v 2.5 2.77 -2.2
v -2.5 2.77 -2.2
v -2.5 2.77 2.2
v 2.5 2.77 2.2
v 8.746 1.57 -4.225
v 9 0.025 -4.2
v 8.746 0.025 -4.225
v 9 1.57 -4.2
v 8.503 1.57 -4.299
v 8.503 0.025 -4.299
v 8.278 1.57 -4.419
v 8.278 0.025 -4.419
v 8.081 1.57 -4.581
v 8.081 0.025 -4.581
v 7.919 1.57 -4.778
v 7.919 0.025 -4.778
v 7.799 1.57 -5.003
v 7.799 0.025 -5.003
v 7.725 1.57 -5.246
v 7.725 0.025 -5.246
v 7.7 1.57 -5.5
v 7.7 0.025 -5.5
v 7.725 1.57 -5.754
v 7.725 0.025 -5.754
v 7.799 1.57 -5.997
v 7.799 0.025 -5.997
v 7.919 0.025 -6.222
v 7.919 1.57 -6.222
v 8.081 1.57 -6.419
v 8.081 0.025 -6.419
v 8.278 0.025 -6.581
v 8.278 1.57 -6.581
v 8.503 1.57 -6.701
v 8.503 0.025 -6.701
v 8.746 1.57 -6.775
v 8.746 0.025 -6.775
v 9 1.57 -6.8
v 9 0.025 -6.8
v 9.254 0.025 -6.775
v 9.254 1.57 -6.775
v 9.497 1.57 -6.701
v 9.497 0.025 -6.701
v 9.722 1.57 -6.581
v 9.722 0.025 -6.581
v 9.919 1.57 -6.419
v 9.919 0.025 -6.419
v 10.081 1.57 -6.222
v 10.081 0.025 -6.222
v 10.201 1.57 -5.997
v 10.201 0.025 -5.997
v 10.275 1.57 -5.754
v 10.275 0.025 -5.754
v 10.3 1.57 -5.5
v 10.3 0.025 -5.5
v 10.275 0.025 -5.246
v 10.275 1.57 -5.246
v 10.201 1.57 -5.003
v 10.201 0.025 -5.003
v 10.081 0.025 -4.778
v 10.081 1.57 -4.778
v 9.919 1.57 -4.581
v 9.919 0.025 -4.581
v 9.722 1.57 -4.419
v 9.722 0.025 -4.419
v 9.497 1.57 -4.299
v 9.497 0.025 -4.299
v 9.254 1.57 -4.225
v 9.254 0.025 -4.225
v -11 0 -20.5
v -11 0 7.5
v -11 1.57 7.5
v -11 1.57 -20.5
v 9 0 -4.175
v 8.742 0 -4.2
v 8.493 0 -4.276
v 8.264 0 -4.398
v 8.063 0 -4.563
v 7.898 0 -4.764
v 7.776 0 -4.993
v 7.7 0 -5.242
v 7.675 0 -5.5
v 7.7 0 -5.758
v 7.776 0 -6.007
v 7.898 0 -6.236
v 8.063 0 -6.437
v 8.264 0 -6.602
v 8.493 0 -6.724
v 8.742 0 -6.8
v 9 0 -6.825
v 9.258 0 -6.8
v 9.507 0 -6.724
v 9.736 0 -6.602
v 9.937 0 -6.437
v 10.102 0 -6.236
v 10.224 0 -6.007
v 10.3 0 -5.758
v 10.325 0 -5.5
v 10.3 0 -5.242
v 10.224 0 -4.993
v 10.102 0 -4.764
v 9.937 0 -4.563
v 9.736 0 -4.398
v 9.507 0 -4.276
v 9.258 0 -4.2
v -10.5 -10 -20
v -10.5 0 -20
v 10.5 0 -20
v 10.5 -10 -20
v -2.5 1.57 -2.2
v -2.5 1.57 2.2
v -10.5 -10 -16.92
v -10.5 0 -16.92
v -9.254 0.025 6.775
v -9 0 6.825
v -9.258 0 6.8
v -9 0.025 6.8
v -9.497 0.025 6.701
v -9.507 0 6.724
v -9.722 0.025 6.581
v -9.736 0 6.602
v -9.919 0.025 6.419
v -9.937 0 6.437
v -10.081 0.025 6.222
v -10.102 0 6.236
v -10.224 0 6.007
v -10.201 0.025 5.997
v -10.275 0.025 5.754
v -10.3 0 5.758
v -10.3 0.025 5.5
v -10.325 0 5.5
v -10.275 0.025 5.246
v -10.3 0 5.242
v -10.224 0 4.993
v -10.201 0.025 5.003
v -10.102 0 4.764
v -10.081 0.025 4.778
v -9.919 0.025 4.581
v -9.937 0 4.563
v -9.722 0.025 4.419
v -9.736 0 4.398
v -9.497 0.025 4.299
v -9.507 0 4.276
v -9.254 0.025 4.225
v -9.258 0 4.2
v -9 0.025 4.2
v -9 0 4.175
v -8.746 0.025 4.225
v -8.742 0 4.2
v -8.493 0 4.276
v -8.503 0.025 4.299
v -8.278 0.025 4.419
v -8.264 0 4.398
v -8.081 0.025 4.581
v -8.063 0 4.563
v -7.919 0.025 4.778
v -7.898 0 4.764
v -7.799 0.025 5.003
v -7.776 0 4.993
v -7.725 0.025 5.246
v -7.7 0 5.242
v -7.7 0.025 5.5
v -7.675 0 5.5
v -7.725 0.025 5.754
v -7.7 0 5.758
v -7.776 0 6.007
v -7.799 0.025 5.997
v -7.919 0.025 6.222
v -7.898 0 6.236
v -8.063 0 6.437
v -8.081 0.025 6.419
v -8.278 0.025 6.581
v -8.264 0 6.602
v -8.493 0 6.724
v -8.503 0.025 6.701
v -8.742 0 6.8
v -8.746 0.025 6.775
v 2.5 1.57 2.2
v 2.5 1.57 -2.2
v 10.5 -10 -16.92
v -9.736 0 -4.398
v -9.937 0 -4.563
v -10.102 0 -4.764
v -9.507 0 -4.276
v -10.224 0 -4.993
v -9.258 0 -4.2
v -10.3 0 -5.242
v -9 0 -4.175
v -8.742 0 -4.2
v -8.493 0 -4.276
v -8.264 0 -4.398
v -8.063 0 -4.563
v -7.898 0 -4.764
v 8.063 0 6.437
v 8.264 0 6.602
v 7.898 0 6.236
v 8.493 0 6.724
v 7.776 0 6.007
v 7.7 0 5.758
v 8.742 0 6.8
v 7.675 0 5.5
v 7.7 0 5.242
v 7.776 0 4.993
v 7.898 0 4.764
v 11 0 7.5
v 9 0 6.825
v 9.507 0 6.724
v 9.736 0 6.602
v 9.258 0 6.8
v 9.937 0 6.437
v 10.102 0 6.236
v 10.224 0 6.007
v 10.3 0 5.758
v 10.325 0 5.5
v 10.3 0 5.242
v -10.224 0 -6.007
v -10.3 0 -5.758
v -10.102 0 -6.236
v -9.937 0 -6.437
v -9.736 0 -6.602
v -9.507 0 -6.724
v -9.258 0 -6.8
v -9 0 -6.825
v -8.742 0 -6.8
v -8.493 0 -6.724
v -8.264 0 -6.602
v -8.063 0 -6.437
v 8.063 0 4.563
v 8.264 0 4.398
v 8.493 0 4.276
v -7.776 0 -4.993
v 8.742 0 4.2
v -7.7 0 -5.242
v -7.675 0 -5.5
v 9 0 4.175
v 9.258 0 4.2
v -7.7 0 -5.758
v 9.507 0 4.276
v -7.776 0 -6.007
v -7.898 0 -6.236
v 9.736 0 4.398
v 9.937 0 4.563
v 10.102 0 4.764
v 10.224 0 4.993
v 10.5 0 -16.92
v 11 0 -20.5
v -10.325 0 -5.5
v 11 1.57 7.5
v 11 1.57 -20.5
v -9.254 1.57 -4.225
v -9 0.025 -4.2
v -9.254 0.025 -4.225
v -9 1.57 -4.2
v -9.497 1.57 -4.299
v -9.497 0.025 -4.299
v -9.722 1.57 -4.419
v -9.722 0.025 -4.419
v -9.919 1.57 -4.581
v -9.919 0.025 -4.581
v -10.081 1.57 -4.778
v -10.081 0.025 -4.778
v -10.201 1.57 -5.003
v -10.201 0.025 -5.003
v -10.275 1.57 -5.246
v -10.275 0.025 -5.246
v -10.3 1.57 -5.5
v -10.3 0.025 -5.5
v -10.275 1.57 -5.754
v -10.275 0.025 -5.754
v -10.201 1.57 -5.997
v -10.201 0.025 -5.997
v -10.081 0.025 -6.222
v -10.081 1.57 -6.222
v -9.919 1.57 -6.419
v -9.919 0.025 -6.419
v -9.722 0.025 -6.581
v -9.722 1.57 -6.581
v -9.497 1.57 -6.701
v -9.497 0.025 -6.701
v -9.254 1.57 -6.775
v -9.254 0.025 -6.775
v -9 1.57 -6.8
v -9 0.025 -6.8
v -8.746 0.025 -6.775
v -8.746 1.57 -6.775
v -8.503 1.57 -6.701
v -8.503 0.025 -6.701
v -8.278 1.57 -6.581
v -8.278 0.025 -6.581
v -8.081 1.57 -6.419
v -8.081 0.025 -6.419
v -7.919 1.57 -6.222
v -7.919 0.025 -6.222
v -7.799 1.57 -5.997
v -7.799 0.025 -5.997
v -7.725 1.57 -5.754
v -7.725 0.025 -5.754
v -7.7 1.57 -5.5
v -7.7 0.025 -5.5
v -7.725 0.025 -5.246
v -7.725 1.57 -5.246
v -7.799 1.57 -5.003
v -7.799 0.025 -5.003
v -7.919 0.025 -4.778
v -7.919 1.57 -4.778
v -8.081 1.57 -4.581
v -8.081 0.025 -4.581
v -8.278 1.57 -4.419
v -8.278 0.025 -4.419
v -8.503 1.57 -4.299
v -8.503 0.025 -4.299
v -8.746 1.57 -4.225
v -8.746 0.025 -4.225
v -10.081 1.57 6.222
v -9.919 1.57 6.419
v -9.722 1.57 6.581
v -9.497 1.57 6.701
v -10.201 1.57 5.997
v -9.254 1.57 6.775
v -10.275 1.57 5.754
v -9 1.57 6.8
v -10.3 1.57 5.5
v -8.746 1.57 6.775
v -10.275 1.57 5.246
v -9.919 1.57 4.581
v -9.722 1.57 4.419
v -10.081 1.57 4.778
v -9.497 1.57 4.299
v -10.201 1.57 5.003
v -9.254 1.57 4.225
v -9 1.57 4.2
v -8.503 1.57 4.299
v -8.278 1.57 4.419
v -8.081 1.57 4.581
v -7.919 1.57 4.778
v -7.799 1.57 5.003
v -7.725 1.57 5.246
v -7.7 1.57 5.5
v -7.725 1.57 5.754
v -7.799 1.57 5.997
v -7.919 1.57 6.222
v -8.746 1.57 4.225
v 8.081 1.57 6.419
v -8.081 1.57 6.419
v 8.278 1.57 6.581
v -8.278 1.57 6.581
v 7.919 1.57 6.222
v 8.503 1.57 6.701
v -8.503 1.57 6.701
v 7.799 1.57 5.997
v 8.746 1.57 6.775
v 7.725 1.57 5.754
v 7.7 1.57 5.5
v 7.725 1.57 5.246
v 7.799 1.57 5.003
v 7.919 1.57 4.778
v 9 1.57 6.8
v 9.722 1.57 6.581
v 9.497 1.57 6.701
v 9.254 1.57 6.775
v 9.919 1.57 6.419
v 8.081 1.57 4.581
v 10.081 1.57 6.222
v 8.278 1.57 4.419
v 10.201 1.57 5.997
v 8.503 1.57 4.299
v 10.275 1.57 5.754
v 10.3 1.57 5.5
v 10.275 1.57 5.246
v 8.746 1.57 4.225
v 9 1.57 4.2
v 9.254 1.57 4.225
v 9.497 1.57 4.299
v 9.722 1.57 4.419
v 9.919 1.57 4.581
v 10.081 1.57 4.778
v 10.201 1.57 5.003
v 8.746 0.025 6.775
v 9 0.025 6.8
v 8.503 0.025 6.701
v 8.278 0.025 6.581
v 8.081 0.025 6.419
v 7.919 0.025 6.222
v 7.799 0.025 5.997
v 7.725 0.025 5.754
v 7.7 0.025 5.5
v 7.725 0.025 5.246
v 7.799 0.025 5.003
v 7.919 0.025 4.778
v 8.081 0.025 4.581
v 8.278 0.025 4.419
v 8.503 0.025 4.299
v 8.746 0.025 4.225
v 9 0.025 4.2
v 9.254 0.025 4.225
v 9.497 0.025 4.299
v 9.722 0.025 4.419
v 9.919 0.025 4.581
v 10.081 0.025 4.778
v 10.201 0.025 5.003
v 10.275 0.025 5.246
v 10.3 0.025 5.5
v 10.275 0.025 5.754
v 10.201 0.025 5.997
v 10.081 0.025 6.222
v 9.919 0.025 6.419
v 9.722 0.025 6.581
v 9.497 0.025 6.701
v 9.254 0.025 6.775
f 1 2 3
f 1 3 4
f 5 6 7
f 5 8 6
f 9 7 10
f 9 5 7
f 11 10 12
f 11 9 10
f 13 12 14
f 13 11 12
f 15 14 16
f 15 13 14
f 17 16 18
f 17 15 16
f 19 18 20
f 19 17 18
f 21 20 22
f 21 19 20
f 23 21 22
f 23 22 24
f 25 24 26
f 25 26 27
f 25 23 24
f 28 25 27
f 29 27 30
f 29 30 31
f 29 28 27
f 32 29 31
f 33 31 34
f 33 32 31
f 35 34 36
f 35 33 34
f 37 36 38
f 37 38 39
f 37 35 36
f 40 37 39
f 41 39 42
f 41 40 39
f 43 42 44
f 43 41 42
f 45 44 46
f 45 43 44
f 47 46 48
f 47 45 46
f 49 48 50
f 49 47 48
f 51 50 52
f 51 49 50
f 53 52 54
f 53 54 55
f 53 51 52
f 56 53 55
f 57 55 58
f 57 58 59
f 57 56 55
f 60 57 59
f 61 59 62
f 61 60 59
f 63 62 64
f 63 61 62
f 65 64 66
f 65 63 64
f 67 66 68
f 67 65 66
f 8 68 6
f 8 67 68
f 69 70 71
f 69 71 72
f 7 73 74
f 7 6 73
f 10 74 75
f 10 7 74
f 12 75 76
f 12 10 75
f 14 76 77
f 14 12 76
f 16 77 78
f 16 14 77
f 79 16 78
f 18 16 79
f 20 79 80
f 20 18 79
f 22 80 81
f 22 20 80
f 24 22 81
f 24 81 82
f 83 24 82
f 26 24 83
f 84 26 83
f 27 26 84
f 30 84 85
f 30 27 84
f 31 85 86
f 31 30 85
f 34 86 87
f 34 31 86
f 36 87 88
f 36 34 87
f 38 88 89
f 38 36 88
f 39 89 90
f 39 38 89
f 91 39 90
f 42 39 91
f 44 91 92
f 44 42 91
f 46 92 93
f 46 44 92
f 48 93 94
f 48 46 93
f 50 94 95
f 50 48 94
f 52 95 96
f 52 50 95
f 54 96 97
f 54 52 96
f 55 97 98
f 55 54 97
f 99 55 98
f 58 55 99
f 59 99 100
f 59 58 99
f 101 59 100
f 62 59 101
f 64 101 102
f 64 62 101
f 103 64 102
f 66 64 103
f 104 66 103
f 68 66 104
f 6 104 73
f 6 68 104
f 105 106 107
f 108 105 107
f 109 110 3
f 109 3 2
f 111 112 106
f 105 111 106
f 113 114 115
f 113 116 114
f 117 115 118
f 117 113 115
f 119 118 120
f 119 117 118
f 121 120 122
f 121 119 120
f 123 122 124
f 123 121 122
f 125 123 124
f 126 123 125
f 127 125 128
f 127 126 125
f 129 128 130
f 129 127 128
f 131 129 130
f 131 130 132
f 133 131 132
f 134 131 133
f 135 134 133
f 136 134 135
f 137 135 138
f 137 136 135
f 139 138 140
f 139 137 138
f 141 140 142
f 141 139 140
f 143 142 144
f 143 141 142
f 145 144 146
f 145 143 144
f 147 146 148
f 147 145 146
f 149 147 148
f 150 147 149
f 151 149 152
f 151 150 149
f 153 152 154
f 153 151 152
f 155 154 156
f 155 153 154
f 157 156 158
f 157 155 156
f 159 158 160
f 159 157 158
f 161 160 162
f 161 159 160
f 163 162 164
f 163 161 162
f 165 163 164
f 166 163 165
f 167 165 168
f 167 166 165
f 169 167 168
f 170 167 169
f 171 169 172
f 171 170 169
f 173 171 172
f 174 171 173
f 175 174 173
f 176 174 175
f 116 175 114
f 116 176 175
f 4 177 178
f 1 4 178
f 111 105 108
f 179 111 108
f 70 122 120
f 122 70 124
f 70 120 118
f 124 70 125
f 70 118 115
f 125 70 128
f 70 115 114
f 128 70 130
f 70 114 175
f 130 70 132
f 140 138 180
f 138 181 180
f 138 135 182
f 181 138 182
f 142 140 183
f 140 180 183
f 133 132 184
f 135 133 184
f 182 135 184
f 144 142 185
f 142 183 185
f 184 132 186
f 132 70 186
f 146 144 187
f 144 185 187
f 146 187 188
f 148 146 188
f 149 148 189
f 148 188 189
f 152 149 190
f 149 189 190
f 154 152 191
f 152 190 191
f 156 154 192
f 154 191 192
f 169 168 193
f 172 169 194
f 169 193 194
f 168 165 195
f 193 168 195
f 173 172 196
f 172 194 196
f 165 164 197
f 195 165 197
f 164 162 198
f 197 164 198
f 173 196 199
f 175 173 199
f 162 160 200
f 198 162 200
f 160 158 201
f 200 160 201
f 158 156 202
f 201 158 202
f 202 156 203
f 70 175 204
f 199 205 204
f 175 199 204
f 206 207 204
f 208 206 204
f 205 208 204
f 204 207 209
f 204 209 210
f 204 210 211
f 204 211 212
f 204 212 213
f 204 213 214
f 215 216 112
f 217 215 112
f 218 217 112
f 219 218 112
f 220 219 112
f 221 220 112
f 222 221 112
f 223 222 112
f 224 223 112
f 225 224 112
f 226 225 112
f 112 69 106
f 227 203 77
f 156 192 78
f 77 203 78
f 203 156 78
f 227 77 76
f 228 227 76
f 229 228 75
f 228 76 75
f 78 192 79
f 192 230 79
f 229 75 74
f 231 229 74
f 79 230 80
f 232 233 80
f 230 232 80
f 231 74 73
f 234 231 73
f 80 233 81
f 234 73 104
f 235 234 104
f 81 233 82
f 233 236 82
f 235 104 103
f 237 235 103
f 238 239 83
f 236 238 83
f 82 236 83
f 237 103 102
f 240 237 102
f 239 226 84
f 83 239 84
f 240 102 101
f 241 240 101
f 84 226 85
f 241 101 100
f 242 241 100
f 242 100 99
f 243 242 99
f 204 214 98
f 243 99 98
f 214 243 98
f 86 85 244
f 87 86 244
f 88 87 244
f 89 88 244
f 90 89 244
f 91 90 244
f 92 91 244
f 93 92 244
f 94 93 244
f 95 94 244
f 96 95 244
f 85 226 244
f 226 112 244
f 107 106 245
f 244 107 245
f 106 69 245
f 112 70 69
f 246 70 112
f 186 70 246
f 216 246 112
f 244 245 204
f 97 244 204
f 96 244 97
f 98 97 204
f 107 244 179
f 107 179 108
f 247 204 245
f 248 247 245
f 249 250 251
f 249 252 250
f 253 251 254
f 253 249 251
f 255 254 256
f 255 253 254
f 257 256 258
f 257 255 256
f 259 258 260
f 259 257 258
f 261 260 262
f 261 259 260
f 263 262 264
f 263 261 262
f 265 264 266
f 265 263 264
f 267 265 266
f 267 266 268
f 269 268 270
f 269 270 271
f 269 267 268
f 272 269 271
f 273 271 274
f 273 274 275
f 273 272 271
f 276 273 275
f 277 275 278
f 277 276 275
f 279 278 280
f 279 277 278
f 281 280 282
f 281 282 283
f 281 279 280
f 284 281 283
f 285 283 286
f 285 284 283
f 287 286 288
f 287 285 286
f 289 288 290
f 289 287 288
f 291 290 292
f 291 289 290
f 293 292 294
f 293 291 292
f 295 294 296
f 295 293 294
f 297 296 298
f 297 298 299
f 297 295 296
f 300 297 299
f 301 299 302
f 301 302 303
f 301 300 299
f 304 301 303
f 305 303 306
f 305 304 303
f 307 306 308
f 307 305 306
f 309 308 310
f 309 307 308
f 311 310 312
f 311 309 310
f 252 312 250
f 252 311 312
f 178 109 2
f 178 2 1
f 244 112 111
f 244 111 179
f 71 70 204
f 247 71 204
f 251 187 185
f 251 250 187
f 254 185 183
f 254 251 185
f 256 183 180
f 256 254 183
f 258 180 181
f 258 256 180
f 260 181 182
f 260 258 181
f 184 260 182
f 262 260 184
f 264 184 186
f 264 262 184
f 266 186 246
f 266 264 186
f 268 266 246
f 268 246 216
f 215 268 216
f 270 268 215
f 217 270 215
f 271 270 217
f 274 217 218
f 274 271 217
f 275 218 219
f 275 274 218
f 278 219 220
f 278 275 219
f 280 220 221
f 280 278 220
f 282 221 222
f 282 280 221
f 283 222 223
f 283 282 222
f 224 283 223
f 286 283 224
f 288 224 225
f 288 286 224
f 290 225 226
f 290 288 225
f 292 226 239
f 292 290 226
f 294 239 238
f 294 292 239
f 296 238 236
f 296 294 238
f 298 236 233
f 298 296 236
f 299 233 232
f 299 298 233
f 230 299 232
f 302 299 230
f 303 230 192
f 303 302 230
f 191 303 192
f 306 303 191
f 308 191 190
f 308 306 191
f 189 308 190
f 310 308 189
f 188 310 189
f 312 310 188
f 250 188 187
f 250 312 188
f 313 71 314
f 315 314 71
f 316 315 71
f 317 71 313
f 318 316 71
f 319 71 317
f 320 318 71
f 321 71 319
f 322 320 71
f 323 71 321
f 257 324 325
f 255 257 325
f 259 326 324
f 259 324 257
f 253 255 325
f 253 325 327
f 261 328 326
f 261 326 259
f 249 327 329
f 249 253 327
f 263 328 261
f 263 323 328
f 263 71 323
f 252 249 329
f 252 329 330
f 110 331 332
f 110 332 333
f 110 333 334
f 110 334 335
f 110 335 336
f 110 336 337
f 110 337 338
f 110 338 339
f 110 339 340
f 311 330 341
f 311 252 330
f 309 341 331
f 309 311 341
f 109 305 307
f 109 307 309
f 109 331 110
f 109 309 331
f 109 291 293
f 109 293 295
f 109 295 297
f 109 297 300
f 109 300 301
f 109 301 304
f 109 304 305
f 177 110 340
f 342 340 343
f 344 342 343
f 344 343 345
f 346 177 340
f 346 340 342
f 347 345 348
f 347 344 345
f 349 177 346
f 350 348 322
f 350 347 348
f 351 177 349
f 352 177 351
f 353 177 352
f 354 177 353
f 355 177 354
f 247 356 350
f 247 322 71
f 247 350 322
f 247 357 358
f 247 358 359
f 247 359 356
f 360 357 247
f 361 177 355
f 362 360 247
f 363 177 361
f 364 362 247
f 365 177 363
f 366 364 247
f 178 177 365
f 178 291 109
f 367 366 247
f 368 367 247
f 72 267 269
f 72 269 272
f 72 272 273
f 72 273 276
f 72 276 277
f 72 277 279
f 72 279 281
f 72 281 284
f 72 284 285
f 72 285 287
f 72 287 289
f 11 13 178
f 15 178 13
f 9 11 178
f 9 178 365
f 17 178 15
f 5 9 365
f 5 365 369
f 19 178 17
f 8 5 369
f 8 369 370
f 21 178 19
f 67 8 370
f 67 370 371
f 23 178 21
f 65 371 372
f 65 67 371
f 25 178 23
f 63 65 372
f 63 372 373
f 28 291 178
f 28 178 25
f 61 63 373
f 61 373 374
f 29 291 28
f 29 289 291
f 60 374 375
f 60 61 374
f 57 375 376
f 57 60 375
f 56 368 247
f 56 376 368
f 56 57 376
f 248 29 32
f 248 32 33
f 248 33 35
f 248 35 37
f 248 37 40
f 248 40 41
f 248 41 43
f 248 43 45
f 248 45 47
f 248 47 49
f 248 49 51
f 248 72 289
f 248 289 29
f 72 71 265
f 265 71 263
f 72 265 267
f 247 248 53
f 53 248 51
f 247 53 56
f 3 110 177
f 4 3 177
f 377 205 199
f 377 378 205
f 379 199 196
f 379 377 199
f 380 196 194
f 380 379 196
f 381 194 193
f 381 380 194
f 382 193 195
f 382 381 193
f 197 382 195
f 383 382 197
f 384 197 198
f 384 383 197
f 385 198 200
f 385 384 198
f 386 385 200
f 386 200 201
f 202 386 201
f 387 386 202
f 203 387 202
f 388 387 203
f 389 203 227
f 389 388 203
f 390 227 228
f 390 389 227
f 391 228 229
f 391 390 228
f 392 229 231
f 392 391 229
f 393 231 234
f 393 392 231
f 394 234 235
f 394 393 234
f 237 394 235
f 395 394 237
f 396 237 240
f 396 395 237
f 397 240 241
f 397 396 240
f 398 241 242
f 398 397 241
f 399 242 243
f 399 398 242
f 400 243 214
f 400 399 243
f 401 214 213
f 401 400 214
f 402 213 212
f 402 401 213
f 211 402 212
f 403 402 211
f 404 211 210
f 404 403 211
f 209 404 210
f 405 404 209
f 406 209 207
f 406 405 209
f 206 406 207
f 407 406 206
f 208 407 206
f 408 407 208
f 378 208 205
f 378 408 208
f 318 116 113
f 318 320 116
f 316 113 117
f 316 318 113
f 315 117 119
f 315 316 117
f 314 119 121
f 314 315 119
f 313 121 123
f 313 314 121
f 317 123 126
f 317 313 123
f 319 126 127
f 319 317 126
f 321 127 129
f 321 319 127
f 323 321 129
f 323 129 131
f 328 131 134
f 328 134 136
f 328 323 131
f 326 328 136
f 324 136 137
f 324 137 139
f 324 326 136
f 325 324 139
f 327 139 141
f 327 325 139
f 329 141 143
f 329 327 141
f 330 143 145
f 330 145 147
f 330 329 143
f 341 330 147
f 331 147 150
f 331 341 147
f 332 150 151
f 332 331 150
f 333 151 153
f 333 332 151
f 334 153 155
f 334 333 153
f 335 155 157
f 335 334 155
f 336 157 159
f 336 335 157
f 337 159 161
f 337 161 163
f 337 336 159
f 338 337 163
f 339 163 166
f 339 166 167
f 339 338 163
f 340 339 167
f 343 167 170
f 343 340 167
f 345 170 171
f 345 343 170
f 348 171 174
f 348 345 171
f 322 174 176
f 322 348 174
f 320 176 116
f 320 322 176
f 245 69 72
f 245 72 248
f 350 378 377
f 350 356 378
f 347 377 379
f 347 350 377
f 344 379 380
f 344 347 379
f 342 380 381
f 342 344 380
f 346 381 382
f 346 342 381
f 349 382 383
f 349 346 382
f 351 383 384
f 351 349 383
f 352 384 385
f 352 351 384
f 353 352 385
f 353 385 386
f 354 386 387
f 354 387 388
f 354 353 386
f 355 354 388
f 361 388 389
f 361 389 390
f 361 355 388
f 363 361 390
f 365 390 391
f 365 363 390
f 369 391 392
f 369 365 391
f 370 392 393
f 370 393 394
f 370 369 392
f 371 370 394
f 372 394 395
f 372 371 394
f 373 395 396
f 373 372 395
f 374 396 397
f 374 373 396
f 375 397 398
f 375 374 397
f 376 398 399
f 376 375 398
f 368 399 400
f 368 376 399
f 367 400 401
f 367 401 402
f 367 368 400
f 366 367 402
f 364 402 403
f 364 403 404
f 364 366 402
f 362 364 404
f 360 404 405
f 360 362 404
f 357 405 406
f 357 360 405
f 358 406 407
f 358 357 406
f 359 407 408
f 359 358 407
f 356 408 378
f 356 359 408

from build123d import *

# Parameters (mm, degrees)
SKETCH1_W                           = 22
SKETCH1_H                           = 28
BOSS_EXTRUDE1_DEPTH                 = 1.57
F_2_6_2_6_DIAMETER_HOLE1_AT_2_COUNT = 2
F_2_6_2_6_DIAMETER_HOLE1_AT_2_PITCH = 11
F_2_6_2_6_DIAMETER_HOLE1_AT_3_COUNT = 2
F_2_6_2_6_DIAMETER_HOLE1_AT_3_PITCH = 21.09502311
F_2_6_2_6_DIAMETER_HOLE1_AT_4_COUNT = 2
F_2_6_2_6_DIAMETER_HOLE1_AT_4_PITCH = 18
SKETCH5_W                           = 5
SKETCH5_H                           = 4.4
BOSS_EXTRUDE2_DEPTH                 = 1.2
SKETCH6_W                           = 21
SKETCH6_H                           = 3.08
BOSS_EXTRUDE3_DEPTH                 = 10


with BuildPart() as part:
    # Sketch1 → Boss-Extrude1 (new body)
    with BuildSketch(Plane(origin=(0, 0, 0), x_dir=(1, 0, 0), z_dir=(0, 1, 0))):
        with Locations((0, 6.5)):
            Rectangle(SKETCH1_W, SKETCH1_H)
    extrude(amount=BOSS_EXTRUDE1_DEPTH)

    # Sketch3 → Ø2.6 (2.6) Diameter Hole1 (revolve, cut)
    with BuildSketch(Plane(origin=(-9, 1.57, -5.5), x_dir=(0, 0, 1), z_dir=(1, 0, 0))):
        Polygon((0, 0), (0, 1.57), (1.325, 1.57), (1.3, 1.545), (1.3, 0), align=None)
    f_2_6_2_6_diameter_hole1 = revolve(axis=Axis((-9, 7.92, -5.5), (0, -1, 0)), mode=Mode.SUBTRACT)

    # Ø2.6 (2.6) Diameter Hole1 at 2: Ø2.6 (2.6) Diameter Hole1 ×2
    with Locations(*[(0, 0, i * F_2_6_2_6_DIAMETER_HOLE1_AT_2_PITCH) for i in range(1, F_2_6_2_6_DIAMETER_HOLE1_AT_2_COUNT)]):
        add(f_2_6_2_6_diameter_hole1, mode=Mode.SUBTRACT)

    # Ø2.6 (2.6) Diameter Hole1 at 3: Ø2.6 (2.6) Diameter Hole1 ×2
    with Locations(*[Vector(0.853281834, 0, 0.521450009) * (i * F_2_6_2_6_DIAMETER_HOLE1_AT_3_PITCH) for i in range(1, F_2_6_2_6_DIAMETER_HOLE1_AT_3_COUNT)]):
        add(f_2_6_2_6_diameter_hole1, mode=Mode.SUBTRACT)

    # Ø2.6 (2.6) Diameter Hole1 at 4: Ø2.6 (2.6) Diameter Hole1 ×2
    with Locations(*[(i * F_2_6_2_6_DIAMETER_HOLE1_AT_4_PITCH, 0, 0) for i in range(1, F_2_6_2_6_DIAMETER_HOLE1_AT_4_COUNT)]):
        add(f_2_6_2_6_diameter_hole1, mode=Mode.SUBTRACT)

    # Sketch5 → Boss-Extrude2 (add)
    with BuildSketch(Plane(origin=(0, 1.57, 0), x_dir=(1, 0, 0), z_dir=(0, 1, 0))):
        Rectangle(SKETCH5_W, SKETCH5_H)
    extrude(amount=BOSS_EXTRUDE2_DEPTH)

    # Sketch6 → Boss-Extrude3 (add)
    with BuildSketch(Plane(origin=(0, 0, 0), x_dir=(1, 0, 0), z_dir=(0, 1, 0))):
        with Locations((0, 18.46)):
            Rectangle(SKETCH6_W, SKETCH6_H)
    extrude(amount=-BOSS_EXTRUDE3_DEPTH)


solid = part.part
